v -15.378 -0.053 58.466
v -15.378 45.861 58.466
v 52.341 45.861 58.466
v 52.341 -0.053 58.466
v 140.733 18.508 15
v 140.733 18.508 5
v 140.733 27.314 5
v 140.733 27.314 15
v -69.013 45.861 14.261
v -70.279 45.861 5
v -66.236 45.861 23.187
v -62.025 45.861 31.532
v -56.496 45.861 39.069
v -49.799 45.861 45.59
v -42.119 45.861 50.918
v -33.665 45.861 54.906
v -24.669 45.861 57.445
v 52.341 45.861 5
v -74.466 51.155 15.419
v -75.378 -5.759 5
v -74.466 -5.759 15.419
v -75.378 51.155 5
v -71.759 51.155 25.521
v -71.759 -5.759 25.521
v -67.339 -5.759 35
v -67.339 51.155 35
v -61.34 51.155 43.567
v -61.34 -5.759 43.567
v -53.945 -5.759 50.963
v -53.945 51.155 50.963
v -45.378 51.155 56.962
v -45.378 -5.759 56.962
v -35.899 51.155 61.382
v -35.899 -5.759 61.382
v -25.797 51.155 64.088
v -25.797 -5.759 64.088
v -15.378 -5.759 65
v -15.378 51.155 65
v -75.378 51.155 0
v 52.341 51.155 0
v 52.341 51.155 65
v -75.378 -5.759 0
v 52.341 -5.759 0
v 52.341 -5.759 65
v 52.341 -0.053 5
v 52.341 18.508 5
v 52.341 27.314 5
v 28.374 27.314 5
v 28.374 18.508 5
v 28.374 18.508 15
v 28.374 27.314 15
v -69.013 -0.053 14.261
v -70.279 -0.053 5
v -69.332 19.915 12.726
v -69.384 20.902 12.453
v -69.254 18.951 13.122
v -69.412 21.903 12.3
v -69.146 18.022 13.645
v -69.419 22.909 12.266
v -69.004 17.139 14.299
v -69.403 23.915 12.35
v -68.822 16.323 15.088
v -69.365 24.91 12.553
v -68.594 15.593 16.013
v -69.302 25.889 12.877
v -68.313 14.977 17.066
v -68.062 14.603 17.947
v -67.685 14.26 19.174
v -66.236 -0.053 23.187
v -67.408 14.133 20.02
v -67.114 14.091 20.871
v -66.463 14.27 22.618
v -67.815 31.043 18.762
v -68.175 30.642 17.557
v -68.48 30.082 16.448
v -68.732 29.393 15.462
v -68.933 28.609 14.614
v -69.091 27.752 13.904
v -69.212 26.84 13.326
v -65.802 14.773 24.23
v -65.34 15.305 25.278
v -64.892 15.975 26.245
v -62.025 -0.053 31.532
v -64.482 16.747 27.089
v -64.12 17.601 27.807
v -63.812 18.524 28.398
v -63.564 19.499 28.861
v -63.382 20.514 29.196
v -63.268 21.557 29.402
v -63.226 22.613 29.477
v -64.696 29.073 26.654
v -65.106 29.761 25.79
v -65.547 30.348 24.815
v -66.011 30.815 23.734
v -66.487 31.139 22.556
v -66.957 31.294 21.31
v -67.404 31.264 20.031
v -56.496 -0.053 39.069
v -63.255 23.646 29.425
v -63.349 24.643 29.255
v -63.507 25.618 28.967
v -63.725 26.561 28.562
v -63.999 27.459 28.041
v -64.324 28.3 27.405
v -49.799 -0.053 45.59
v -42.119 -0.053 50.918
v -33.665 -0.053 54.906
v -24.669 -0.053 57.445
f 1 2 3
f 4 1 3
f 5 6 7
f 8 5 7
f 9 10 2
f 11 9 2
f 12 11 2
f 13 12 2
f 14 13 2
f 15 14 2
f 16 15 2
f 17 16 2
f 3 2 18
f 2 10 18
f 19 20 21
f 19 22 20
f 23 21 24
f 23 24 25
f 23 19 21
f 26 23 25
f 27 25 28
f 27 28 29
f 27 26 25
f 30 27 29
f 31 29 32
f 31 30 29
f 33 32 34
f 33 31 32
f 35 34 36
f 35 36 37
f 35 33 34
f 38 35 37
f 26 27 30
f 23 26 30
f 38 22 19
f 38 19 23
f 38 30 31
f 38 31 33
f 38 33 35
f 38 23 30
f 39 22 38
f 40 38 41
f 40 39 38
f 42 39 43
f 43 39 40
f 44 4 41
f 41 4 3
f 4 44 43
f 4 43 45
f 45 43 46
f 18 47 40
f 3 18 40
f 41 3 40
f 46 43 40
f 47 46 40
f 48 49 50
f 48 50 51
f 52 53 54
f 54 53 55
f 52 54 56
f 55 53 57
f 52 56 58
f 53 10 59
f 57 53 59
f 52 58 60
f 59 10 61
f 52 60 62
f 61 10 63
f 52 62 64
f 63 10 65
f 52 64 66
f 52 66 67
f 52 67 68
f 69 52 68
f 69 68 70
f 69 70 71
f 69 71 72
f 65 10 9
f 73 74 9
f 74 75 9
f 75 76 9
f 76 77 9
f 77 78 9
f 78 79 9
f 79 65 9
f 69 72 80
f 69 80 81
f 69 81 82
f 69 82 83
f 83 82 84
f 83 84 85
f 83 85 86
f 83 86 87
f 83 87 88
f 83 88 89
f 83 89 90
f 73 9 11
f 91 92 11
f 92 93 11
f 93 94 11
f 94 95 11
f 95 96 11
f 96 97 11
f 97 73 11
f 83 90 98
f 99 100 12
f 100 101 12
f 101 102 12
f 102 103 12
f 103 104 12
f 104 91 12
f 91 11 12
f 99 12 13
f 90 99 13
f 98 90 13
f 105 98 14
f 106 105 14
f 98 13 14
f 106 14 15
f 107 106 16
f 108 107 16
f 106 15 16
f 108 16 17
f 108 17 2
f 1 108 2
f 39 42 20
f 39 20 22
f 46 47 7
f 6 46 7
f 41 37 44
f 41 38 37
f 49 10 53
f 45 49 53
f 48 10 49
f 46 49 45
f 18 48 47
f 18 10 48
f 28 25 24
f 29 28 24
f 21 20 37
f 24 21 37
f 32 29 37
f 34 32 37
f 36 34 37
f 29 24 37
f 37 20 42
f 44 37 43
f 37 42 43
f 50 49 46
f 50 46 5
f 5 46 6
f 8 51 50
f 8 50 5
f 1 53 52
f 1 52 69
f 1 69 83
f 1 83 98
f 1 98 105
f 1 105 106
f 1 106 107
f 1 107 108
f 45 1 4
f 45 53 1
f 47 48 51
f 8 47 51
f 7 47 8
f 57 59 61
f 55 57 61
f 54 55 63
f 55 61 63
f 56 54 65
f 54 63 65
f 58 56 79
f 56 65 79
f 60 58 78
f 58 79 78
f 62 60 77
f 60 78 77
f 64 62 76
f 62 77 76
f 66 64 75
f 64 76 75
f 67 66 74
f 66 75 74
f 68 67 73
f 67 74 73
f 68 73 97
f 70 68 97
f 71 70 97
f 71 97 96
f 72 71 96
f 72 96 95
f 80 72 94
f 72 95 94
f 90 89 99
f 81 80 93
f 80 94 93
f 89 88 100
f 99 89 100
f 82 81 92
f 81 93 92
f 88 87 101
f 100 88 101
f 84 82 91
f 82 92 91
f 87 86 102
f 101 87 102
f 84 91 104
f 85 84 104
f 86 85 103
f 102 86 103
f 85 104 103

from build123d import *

# Parameters (mm, degrees)
F0_W      = 127.7185976505
F0_H      = 56.9143816829
F1_DEPTH  = 5
F2_W      = 127.7185976505
F2_H      = 5.2938833833
F2_H_2    = 5.7062916458
F2_W_2    = 112.358585
F2_H_3    = 8.8055357337
F3_DEPTH  = 60
F4_R      = 60
F6_DEPTH  = 46
F7_R      = 8.607172032
F8_DEPTH  = 20
F9_DEPTH  = 25
F10_DEPTH = 50
F5_W      = 67.7185976505
F5_H      = 6.5335953236
F11_DEPTH = 48


with BuildPart() as f1:
    # F0 (on Top) → F1 (new body)
    with BuildSketch(Plane.XY):
        with Locations((-11.5184038877, 22.6980000734)):
            Rectangle(F0_W, F0_H)
    extrude(amount=F1_DEPTH)

    # F2 (on face) → F3 (join)
    with BuildSketch(Plane.XY.offset(5)):
        with Locations((-11.5184038877, 48.5082492232)):
            Rectangle(F2_W, F2_H)
        with Locations((-11.5184038877, -2.9060449451)):
            Rectangle(F2_W, F2_H_2)
        with Locations((84.5533981919, 22.9110382497)):
            Rectangle(F2_W_2, F2_H_3)
    extrude(amount=F3_DEPTH)

    # F4
    f4_edges = [f1.edges().sort_by_distance(p)[0] for p in [
        (-75.377703, 48.508249, 65),
        (-75.377703, -2.906045, 65),
    ]]
    fillet(f4_edges, radius=F4_R)

    # F5 (on face) → F6 (join)
    with BuildSketch(Plane.XZ.offset(-45.8613075316)):
        with BuildLine():
            Line((-15.377702713, 58.4664046764), (-15.377702713, 65))
            ThreePointArc((-15.377702713, 65), (-57.8041095842, 47.4264068712), (-75.377702713, 5))
            Line((-75.377702713, 5), (-70.2792108059, 5))
            ThreePointArc((-70.2792108059, 5), (-53.2827635395, 42.4681154442), (-15.377702713, 58.4664046764))
        make_face()
    extrude(amount=F6_DEPTH)

    # F7 (on face) → F8 (cut)
    with BuildSketch(Plane(origin=(-75.377702713, 0, 0), x_dir=(0, -1, 0), z_dir=(-1, 0, 0))):
        with Locations((-22.6980000734, 20.8706017584)):
            Circle(F7_R)
    extrude(amount=-F8_DEPTH, mode=Mode.SUBTRACT)

    # F7 (on face) → F9 (cut)
    with BuildSketch(Plane(origin=(-75.377702713, 0, 0), x_dir=(0, -1, 0), z_dir=(-1, 0, 0))):
        with Locations((-22.6980000734, 20.8706017584)):
            Circle(F7_R)
    extrude(amount=-F9_DEPTH, mode=Mode.SUBTRACT)

    # F10 (cut): a face of the model
    f10_faces = [f1.faces().sort_by_distance(p)[0] for p in [
        (84.5533981919, 22.9110382497, 65),
    ]]
    extrude(f10_faces, amount=-F10_DEPTH, mode=Mode.SUBTRACT)

    # F5 (on face) → F11 (join)
    with BuildSketch(Plane.XZ.offset(-45.8613075316)):
        with BuildLine():
            Line((-15.377702713, 58.4664046764), (-15.377702713, 65))
            ThreePointArc((-15.377702713, 65), (-57.8041095842, 47.4264068712), (-75.377702713, 5))
            Line((-75.377702713, 5), (-70.2792108059, 5))
            ThreePointArc((-70.2792108059, 5), (-53.2827635395, 42.4681154442), (-15.377702713, 58.4664046764))
        make_face()
        with Locations((18.4815961123, 61.7332023382)):
            Rectangle(F5_W, F5_H)
    extrude(amount=F11_DEPTH)


solid = f1.part
